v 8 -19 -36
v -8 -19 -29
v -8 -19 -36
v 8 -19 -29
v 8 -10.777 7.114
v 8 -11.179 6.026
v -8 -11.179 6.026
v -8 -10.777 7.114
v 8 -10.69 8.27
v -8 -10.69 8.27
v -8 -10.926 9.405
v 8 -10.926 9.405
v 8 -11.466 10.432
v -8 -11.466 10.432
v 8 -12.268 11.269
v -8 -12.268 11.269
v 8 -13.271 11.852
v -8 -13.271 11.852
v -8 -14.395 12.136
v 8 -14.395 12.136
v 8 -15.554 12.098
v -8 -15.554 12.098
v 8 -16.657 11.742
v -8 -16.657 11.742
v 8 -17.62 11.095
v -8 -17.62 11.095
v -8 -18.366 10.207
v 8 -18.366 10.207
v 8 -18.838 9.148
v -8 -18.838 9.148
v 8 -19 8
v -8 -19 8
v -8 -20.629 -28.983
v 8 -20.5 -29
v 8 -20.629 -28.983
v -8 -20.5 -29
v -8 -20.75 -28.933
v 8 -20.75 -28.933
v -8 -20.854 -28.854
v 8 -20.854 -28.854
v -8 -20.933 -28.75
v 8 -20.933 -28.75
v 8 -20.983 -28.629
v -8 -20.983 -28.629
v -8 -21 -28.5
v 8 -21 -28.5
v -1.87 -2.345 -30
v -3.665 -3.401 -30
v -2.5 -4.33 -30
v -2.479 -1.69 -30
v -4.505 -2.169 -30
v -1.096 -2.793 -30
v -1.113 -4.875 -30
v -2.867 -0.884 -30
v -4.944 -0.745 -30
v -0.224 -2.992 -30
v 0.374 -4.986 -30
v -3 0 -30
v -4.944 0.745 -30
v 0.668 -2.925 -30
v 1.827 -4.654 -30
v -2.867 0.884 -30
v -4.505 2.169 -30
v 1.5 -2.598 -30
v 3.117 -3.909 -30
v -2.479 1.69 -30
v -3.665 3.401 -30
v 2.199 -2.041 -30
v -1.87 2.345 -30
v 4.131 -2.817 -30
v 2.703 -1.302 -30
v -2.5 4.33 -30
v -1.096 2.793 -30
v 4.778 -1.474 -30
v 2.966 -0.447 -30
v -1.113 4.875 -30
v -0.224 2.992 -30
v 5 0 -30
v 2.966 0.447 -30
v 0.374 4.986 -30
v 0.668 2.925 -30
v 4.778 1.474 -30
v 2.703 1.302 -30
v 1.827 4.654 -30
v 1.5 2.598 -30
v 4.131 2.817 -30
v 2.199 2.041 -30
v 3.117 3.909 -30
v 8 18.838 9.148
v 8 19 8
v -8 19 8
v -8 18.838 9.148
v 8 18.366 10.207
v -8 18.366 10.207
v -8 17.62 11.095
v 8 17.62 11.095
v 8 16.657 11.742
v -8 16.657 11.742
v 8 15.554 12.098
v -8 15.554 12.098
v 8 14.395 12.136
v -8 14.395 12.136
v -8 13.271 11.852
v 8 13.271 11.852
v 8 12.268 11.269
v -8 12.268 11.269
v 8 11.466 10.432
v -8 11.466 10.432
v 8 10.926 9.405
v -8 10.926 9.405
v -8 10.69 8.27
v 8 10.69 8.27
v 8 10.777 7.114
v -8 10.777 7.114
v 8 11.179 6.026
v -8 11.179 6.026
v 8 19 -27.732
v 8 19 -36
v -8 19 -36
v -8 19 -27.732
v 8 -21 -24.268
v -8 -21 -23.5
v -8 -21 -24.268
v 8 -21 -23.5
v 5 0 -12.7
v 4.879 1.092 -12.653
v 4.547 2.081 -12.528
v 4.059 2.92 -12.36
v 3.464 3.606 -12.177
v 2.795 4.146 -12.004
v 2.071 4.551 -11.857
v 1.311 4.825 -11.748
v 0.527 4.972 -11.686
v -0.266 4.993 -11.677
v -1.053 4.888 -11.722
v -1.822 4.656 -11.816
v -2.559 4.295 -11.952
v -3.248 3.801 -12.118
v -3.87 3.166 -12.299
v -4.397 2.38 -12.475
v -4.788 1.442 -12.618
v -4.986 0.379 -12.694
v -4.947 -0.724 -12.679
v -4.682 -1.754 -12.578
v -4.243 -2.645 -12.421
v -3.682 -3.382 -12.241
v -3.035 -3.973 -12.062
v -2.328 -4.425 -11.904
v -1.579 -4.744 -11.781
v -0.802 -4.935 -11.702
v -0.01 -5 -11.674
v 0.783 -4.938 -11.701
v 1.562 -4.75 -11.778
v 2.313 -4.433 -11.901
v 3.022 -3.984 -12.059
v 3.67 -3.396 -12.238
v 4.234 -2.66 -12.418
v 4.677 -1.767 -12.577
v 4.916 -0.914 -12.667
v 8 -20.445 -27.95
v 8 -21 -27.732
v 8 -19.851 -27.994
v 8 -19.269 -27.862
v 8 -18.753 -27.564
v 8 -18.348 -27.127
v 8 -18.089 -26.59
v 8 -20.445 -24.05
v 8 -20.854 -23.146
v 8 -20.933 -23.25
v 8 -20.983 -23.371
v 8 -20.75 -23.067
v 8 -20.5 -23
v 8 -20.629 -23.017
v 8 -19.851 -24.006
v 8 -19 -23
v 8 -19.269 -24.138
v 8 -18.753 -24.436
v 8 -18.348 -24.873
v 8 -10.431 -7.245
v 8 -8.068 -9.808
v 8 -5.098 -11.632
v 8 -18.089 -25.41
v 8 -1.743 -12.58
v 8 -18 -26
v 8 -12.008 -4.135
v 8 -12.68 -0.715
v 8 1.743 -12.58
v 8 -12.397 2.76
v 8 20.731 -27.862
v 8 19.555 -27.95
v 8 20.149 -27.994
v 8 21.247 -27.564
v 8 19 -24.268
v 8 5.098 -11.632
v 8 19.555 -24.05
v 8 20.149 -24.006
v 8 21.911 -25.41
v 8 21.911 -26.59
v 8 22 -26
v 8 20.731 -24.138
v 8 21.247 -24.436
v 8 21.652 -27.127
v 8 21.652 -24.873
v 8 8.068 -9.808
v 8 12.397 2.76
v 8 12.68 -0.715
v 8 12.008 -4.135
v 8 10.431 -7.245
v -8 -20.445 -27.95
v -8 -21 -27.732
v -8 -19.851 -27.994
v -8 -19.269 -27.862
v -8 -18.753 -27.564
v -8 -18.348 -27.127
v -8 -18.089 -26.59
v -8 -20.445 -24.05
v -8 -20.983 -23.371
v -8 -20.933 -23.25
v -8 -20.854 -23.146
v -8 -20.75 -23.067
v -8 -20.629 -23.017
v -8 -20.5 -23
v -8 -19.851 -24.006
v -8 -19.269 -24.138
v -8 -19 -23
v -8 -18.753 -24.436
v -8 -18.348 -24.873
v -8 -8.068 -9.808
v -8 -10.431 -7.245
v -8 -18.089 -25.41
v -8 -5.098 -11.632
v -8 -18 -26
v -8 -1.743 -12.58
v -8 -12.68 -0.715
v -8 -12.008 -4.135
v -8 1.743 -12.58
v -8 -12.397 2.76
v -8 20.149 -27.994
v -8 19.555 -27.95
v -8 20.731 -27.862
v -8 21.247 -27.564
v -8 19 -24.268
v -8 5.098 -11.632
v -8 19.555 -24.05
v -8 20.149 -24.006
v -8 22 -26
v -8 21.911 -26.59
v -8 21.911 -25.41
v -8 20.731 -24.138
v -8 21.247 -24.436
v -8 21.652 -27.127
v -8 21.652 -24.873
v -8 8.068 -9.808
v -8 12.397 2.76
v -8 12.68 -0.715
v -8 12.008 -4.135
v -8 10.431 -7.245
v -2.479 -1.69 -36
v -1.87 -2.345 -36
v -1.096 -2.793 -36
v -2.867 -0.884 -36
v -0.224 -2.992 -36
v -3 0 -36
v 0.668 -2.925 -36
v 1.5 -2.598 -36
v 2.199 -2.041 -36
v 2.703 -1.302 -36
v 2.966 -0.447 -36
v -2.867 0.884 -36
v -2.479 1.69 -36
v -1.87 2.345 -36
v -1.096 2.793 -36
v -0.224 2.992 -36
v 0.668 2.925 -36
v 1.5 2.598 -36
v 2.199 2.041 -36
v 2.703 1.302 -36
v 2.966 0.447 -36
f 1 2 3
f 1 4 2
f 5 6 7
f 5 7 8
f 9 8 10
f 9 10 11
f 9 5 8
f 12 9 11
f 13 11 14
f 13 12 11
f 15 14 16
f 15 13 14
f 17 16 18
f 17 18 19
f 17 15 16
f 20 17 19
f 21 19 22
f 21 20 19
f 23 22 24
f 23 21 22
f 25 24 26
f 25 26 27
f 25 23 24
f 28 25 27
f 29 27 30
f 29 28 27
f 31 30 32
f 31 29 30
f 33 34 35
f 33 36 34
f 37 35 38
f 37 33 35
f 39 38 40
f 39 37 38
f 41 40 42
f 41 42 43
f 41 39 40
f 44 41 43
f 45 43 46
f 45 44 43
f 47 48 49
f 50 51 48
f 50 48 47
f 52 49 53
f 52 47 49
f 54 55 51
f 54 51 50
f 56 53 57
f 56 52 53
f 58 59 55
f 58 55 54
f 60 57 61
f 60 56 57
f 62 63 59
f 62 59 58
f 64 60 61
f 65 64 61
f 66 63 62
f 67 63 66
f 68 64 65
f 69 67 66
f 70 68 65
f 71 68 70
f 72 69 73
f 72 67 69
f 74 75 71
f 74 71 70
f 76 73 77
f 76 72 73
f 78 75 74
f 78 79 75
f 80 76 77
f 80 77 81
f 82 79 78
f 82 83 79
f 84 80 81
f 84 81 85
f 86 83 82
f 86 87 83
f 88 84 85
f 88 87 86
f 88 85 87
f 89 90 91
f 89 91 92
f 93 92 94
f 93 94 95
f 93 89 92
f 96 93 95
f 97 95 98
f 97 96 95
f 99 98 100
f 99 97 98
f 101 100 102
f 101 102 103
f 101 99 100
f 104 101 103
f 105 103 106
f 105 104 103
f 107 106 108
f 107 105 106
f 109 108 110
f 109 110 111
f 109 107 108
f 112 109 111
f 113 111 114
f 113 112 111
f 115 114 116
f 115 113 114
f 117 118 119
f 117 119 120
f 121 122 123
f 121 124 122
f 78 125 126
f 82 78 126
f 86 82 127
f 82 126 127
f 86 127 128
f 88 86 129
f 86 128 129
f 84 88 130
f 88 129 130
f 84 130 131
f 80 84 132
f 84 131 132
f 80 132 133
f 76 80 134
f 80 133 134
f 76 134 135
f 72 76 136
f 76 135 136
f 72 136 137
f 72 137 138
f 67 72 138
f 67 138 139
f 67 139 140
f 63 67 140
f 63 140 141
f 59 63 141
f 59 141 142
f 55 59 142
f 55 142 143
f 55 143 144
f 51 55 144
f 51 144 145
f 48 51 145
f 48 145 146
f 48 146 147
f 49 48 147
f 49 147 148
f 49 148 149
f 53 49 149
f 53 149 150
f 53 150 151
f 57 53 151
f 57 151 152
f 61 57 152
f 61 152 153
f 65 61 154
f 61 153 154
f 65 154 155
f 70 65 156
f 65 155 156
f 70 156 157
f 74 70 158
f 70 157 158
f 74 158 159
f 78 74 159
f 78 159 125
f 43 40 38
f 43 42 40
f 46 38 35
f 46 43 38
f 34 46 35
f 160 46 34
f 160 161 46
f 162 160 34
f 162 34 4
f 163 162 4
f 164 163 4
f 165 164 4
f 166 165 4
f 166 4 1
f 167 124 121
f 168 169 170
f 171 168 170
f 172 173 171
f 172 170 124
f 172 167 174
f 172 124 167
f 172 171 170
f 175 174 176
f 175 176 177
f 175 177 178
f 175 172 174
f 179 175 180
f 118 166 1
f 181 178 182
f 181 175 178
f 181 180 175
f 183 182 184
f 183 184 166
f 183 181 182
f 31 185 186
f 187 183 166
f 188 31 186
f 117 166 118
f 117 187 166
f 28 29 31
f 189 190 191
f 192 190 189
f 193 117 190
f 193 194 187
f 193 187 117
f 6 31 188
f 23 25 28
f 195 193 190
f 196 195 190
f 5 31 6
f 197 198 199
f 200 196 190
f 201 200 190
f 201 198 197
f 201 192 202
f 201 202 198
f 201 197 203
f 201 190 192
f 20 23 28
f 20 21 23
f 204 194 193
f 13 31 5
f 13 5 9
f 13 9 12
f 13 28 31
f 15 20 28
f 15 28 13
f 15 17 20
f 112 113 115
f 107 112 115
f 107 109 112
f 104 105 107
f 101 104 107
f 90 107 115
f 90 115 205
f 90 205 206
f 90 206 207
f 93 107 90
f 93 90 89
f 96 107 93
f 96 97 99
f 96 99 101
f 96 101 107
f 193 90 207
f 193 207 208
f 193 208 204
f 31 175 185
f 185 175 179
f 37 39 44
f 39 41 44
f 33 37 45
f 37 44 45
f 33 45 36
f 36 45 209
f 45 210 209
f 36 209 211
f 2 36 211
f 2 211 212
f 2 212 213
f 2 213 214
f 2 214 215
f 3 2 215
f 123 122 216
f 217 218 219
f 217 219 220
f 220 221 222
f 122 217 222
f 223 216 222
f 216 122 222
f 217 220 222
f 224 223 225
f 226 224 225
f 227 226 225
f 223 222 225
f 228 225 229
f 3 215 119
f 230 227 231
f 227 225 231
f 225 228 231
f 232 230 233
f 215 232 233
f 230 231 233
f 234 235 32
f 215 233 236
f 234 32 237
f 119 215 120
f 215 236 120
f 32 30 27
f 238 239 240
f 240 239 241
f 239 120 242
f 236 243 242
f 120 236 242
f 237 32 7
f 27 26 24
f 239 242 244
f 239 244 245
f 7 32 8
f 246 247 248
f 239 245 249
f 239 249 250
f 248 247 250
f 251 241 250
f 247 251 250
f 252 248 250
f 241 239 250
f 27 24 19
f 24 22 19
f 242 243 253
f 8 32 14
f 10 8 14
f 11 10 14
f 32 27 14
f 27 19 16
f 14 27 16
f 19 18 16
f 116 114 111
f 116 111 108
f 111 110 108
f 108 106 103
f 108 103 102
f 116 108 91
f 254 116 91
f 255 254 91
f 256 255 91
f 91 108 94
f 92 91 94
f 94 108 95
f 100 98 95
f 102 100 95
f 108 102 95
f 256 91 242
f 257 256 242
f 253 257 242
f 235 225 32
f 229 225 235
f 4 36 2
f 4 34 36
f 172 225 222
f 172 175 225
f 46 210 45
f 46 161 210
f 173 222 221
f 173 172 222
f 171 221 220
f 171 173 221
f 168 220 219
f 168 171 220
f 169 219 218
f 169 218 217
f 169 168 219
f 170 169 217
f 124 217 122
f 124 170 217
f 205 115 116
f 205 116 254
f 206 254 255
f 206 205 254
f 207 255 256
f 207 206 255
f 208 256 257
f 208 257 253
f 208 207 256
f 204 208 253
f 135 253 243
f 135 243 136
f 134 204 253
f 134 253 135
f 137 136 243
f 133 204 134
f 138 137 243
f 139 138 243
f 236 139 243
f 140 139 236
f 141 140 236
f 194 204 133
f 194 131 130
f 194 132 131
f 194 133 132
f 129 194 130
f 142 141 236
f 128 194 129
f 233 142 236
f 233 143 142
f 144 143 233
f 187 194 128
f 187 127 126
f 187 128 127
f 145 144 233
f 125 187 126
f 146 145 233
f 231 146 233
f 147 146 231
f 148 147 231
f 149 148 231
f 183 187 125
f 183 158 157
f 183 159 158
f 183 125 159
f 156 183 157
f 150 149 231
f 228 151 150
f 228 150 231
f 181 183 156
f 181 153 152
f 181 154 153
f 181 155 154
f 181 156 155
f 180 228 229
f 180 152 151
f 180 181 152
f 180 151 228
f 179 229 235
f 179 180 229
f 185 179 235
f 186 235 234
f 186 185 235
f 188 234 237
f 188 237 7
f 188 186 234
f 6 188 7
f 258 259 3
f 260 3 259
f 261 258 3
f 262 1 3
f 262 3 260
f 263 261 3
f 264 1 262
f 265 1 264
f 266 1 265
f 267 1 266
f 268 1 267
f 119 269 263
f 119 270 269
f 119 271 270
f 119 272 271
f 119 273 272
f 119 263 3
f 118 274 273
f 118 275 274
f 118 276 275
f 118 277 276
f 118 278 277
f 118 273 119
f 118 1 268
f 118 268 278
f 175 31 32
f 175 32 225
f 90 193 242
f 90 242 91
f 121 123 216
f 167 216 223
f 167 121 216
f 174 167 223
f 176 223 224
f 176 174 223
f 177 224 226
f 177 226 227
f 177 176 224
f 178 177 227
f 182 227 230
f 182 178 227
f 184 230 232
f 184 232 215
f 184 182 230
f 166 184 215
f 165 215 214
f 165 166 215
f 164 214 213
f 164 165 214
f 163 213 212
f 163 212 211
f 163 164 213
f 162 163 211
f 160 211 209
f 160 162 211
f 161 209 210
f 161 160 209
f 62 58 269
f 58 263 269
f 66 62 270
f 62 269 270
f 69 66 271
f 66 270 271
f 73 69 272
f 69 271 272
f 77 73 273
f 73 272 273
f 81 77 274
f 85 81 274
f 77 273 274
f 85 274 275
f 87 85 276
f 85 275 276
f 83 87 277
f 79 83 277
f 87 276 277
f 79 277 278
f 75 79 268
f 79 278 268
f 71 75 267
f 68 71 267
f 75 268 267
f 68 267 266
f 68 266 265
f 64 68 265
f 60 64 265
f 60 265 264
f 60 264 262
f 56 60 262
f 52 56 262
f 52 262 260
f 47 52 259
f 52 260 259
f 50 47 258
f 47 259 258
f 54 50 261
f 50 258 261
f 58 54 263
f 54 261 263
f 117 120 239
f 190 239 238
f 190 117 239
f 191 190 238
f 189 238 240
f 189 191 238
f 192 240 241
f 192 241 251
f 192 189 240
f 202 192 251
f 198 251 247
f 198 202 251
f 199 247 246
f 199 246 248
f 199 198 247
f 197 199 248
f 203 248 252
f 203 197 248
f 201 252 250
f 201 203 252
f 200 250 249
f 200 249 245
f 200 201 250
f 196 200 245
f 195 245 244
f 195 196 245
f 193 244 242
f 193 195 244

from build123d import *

# Parameters (mm, degrees)
F1_DEPTH       = 8
F1_DEPTH_BACK  = 8
F3_D           = 6
F3_START       = 12.7000001
F3_CBORE_D     = 10
F3_CBORE_DEPTH = 17.3
F4_R           = 0.5


with BuildPart() as f1:
    # F0 (on Right) → F1 (new body, two sides)
    with BuildSketch(Plane.YZ) as f1_sk:
        with BuildLine():
            Line((-19, -29), (-19, -36))
            Line((-19, -36), (19, -36))
            Line((19, -36), (19, -27.7320508076))
            ThreePointArc((19, -27.7320508076), (22, -26), (19, -24.2679491924))
            Line((19, -24.2679491924), (19, -16.2))
            Line((19, -16.2), (19, 8))
            ThreePointArc((19, 8), (13.8227400876, 12.0330174031), (11.1791699801, 6.026288954))
            ThreePointArc((11.1791699801, 6.026288954), (0, -12.7), (-11.1791699801, 6.026288954))
            ThreePointArc((-11.1791699801, 6.026288954), (-13.8227400876, 12.0330174031), (-19, 8))
            Line((-19, 8), (-19, -23))
            Line((-19, -23), (-21, -23))
            Line((-21, -23), (-21, -24.2679491924))
            ThreePointArc((-21, -24.2679491924), (-18, -26), (-21, -27.7320508076))
            Line((-21, -27.7320508076), (-21, -29))
            Line((-21, -29), (-19, -29))
        make_face()
    extrude(amount=F1_DEPTH)
    extrude(f1_sk.sketch, amount=-F1_DEPTH_BACK)

    # F3 (through all)
    # its depths count from where the whole tool has entered the part; down to there all is cleared
    with Locations(Plane.XY.offset(-F3_START)):
        with Locations((0, 0)):
            CounterBoreHole(F3_D / 2, F3_CBORE_D / 2, F3_CBORE_DEPTH)

    # F4
    f4_edges = [f1.edges().sort_by_distance(p)[0] for p in [
        (0, -21, -23),
        (0, -21, -29),
    ]]
    fillet(f4_edges, radius=F4_R)


solid = f1.part
